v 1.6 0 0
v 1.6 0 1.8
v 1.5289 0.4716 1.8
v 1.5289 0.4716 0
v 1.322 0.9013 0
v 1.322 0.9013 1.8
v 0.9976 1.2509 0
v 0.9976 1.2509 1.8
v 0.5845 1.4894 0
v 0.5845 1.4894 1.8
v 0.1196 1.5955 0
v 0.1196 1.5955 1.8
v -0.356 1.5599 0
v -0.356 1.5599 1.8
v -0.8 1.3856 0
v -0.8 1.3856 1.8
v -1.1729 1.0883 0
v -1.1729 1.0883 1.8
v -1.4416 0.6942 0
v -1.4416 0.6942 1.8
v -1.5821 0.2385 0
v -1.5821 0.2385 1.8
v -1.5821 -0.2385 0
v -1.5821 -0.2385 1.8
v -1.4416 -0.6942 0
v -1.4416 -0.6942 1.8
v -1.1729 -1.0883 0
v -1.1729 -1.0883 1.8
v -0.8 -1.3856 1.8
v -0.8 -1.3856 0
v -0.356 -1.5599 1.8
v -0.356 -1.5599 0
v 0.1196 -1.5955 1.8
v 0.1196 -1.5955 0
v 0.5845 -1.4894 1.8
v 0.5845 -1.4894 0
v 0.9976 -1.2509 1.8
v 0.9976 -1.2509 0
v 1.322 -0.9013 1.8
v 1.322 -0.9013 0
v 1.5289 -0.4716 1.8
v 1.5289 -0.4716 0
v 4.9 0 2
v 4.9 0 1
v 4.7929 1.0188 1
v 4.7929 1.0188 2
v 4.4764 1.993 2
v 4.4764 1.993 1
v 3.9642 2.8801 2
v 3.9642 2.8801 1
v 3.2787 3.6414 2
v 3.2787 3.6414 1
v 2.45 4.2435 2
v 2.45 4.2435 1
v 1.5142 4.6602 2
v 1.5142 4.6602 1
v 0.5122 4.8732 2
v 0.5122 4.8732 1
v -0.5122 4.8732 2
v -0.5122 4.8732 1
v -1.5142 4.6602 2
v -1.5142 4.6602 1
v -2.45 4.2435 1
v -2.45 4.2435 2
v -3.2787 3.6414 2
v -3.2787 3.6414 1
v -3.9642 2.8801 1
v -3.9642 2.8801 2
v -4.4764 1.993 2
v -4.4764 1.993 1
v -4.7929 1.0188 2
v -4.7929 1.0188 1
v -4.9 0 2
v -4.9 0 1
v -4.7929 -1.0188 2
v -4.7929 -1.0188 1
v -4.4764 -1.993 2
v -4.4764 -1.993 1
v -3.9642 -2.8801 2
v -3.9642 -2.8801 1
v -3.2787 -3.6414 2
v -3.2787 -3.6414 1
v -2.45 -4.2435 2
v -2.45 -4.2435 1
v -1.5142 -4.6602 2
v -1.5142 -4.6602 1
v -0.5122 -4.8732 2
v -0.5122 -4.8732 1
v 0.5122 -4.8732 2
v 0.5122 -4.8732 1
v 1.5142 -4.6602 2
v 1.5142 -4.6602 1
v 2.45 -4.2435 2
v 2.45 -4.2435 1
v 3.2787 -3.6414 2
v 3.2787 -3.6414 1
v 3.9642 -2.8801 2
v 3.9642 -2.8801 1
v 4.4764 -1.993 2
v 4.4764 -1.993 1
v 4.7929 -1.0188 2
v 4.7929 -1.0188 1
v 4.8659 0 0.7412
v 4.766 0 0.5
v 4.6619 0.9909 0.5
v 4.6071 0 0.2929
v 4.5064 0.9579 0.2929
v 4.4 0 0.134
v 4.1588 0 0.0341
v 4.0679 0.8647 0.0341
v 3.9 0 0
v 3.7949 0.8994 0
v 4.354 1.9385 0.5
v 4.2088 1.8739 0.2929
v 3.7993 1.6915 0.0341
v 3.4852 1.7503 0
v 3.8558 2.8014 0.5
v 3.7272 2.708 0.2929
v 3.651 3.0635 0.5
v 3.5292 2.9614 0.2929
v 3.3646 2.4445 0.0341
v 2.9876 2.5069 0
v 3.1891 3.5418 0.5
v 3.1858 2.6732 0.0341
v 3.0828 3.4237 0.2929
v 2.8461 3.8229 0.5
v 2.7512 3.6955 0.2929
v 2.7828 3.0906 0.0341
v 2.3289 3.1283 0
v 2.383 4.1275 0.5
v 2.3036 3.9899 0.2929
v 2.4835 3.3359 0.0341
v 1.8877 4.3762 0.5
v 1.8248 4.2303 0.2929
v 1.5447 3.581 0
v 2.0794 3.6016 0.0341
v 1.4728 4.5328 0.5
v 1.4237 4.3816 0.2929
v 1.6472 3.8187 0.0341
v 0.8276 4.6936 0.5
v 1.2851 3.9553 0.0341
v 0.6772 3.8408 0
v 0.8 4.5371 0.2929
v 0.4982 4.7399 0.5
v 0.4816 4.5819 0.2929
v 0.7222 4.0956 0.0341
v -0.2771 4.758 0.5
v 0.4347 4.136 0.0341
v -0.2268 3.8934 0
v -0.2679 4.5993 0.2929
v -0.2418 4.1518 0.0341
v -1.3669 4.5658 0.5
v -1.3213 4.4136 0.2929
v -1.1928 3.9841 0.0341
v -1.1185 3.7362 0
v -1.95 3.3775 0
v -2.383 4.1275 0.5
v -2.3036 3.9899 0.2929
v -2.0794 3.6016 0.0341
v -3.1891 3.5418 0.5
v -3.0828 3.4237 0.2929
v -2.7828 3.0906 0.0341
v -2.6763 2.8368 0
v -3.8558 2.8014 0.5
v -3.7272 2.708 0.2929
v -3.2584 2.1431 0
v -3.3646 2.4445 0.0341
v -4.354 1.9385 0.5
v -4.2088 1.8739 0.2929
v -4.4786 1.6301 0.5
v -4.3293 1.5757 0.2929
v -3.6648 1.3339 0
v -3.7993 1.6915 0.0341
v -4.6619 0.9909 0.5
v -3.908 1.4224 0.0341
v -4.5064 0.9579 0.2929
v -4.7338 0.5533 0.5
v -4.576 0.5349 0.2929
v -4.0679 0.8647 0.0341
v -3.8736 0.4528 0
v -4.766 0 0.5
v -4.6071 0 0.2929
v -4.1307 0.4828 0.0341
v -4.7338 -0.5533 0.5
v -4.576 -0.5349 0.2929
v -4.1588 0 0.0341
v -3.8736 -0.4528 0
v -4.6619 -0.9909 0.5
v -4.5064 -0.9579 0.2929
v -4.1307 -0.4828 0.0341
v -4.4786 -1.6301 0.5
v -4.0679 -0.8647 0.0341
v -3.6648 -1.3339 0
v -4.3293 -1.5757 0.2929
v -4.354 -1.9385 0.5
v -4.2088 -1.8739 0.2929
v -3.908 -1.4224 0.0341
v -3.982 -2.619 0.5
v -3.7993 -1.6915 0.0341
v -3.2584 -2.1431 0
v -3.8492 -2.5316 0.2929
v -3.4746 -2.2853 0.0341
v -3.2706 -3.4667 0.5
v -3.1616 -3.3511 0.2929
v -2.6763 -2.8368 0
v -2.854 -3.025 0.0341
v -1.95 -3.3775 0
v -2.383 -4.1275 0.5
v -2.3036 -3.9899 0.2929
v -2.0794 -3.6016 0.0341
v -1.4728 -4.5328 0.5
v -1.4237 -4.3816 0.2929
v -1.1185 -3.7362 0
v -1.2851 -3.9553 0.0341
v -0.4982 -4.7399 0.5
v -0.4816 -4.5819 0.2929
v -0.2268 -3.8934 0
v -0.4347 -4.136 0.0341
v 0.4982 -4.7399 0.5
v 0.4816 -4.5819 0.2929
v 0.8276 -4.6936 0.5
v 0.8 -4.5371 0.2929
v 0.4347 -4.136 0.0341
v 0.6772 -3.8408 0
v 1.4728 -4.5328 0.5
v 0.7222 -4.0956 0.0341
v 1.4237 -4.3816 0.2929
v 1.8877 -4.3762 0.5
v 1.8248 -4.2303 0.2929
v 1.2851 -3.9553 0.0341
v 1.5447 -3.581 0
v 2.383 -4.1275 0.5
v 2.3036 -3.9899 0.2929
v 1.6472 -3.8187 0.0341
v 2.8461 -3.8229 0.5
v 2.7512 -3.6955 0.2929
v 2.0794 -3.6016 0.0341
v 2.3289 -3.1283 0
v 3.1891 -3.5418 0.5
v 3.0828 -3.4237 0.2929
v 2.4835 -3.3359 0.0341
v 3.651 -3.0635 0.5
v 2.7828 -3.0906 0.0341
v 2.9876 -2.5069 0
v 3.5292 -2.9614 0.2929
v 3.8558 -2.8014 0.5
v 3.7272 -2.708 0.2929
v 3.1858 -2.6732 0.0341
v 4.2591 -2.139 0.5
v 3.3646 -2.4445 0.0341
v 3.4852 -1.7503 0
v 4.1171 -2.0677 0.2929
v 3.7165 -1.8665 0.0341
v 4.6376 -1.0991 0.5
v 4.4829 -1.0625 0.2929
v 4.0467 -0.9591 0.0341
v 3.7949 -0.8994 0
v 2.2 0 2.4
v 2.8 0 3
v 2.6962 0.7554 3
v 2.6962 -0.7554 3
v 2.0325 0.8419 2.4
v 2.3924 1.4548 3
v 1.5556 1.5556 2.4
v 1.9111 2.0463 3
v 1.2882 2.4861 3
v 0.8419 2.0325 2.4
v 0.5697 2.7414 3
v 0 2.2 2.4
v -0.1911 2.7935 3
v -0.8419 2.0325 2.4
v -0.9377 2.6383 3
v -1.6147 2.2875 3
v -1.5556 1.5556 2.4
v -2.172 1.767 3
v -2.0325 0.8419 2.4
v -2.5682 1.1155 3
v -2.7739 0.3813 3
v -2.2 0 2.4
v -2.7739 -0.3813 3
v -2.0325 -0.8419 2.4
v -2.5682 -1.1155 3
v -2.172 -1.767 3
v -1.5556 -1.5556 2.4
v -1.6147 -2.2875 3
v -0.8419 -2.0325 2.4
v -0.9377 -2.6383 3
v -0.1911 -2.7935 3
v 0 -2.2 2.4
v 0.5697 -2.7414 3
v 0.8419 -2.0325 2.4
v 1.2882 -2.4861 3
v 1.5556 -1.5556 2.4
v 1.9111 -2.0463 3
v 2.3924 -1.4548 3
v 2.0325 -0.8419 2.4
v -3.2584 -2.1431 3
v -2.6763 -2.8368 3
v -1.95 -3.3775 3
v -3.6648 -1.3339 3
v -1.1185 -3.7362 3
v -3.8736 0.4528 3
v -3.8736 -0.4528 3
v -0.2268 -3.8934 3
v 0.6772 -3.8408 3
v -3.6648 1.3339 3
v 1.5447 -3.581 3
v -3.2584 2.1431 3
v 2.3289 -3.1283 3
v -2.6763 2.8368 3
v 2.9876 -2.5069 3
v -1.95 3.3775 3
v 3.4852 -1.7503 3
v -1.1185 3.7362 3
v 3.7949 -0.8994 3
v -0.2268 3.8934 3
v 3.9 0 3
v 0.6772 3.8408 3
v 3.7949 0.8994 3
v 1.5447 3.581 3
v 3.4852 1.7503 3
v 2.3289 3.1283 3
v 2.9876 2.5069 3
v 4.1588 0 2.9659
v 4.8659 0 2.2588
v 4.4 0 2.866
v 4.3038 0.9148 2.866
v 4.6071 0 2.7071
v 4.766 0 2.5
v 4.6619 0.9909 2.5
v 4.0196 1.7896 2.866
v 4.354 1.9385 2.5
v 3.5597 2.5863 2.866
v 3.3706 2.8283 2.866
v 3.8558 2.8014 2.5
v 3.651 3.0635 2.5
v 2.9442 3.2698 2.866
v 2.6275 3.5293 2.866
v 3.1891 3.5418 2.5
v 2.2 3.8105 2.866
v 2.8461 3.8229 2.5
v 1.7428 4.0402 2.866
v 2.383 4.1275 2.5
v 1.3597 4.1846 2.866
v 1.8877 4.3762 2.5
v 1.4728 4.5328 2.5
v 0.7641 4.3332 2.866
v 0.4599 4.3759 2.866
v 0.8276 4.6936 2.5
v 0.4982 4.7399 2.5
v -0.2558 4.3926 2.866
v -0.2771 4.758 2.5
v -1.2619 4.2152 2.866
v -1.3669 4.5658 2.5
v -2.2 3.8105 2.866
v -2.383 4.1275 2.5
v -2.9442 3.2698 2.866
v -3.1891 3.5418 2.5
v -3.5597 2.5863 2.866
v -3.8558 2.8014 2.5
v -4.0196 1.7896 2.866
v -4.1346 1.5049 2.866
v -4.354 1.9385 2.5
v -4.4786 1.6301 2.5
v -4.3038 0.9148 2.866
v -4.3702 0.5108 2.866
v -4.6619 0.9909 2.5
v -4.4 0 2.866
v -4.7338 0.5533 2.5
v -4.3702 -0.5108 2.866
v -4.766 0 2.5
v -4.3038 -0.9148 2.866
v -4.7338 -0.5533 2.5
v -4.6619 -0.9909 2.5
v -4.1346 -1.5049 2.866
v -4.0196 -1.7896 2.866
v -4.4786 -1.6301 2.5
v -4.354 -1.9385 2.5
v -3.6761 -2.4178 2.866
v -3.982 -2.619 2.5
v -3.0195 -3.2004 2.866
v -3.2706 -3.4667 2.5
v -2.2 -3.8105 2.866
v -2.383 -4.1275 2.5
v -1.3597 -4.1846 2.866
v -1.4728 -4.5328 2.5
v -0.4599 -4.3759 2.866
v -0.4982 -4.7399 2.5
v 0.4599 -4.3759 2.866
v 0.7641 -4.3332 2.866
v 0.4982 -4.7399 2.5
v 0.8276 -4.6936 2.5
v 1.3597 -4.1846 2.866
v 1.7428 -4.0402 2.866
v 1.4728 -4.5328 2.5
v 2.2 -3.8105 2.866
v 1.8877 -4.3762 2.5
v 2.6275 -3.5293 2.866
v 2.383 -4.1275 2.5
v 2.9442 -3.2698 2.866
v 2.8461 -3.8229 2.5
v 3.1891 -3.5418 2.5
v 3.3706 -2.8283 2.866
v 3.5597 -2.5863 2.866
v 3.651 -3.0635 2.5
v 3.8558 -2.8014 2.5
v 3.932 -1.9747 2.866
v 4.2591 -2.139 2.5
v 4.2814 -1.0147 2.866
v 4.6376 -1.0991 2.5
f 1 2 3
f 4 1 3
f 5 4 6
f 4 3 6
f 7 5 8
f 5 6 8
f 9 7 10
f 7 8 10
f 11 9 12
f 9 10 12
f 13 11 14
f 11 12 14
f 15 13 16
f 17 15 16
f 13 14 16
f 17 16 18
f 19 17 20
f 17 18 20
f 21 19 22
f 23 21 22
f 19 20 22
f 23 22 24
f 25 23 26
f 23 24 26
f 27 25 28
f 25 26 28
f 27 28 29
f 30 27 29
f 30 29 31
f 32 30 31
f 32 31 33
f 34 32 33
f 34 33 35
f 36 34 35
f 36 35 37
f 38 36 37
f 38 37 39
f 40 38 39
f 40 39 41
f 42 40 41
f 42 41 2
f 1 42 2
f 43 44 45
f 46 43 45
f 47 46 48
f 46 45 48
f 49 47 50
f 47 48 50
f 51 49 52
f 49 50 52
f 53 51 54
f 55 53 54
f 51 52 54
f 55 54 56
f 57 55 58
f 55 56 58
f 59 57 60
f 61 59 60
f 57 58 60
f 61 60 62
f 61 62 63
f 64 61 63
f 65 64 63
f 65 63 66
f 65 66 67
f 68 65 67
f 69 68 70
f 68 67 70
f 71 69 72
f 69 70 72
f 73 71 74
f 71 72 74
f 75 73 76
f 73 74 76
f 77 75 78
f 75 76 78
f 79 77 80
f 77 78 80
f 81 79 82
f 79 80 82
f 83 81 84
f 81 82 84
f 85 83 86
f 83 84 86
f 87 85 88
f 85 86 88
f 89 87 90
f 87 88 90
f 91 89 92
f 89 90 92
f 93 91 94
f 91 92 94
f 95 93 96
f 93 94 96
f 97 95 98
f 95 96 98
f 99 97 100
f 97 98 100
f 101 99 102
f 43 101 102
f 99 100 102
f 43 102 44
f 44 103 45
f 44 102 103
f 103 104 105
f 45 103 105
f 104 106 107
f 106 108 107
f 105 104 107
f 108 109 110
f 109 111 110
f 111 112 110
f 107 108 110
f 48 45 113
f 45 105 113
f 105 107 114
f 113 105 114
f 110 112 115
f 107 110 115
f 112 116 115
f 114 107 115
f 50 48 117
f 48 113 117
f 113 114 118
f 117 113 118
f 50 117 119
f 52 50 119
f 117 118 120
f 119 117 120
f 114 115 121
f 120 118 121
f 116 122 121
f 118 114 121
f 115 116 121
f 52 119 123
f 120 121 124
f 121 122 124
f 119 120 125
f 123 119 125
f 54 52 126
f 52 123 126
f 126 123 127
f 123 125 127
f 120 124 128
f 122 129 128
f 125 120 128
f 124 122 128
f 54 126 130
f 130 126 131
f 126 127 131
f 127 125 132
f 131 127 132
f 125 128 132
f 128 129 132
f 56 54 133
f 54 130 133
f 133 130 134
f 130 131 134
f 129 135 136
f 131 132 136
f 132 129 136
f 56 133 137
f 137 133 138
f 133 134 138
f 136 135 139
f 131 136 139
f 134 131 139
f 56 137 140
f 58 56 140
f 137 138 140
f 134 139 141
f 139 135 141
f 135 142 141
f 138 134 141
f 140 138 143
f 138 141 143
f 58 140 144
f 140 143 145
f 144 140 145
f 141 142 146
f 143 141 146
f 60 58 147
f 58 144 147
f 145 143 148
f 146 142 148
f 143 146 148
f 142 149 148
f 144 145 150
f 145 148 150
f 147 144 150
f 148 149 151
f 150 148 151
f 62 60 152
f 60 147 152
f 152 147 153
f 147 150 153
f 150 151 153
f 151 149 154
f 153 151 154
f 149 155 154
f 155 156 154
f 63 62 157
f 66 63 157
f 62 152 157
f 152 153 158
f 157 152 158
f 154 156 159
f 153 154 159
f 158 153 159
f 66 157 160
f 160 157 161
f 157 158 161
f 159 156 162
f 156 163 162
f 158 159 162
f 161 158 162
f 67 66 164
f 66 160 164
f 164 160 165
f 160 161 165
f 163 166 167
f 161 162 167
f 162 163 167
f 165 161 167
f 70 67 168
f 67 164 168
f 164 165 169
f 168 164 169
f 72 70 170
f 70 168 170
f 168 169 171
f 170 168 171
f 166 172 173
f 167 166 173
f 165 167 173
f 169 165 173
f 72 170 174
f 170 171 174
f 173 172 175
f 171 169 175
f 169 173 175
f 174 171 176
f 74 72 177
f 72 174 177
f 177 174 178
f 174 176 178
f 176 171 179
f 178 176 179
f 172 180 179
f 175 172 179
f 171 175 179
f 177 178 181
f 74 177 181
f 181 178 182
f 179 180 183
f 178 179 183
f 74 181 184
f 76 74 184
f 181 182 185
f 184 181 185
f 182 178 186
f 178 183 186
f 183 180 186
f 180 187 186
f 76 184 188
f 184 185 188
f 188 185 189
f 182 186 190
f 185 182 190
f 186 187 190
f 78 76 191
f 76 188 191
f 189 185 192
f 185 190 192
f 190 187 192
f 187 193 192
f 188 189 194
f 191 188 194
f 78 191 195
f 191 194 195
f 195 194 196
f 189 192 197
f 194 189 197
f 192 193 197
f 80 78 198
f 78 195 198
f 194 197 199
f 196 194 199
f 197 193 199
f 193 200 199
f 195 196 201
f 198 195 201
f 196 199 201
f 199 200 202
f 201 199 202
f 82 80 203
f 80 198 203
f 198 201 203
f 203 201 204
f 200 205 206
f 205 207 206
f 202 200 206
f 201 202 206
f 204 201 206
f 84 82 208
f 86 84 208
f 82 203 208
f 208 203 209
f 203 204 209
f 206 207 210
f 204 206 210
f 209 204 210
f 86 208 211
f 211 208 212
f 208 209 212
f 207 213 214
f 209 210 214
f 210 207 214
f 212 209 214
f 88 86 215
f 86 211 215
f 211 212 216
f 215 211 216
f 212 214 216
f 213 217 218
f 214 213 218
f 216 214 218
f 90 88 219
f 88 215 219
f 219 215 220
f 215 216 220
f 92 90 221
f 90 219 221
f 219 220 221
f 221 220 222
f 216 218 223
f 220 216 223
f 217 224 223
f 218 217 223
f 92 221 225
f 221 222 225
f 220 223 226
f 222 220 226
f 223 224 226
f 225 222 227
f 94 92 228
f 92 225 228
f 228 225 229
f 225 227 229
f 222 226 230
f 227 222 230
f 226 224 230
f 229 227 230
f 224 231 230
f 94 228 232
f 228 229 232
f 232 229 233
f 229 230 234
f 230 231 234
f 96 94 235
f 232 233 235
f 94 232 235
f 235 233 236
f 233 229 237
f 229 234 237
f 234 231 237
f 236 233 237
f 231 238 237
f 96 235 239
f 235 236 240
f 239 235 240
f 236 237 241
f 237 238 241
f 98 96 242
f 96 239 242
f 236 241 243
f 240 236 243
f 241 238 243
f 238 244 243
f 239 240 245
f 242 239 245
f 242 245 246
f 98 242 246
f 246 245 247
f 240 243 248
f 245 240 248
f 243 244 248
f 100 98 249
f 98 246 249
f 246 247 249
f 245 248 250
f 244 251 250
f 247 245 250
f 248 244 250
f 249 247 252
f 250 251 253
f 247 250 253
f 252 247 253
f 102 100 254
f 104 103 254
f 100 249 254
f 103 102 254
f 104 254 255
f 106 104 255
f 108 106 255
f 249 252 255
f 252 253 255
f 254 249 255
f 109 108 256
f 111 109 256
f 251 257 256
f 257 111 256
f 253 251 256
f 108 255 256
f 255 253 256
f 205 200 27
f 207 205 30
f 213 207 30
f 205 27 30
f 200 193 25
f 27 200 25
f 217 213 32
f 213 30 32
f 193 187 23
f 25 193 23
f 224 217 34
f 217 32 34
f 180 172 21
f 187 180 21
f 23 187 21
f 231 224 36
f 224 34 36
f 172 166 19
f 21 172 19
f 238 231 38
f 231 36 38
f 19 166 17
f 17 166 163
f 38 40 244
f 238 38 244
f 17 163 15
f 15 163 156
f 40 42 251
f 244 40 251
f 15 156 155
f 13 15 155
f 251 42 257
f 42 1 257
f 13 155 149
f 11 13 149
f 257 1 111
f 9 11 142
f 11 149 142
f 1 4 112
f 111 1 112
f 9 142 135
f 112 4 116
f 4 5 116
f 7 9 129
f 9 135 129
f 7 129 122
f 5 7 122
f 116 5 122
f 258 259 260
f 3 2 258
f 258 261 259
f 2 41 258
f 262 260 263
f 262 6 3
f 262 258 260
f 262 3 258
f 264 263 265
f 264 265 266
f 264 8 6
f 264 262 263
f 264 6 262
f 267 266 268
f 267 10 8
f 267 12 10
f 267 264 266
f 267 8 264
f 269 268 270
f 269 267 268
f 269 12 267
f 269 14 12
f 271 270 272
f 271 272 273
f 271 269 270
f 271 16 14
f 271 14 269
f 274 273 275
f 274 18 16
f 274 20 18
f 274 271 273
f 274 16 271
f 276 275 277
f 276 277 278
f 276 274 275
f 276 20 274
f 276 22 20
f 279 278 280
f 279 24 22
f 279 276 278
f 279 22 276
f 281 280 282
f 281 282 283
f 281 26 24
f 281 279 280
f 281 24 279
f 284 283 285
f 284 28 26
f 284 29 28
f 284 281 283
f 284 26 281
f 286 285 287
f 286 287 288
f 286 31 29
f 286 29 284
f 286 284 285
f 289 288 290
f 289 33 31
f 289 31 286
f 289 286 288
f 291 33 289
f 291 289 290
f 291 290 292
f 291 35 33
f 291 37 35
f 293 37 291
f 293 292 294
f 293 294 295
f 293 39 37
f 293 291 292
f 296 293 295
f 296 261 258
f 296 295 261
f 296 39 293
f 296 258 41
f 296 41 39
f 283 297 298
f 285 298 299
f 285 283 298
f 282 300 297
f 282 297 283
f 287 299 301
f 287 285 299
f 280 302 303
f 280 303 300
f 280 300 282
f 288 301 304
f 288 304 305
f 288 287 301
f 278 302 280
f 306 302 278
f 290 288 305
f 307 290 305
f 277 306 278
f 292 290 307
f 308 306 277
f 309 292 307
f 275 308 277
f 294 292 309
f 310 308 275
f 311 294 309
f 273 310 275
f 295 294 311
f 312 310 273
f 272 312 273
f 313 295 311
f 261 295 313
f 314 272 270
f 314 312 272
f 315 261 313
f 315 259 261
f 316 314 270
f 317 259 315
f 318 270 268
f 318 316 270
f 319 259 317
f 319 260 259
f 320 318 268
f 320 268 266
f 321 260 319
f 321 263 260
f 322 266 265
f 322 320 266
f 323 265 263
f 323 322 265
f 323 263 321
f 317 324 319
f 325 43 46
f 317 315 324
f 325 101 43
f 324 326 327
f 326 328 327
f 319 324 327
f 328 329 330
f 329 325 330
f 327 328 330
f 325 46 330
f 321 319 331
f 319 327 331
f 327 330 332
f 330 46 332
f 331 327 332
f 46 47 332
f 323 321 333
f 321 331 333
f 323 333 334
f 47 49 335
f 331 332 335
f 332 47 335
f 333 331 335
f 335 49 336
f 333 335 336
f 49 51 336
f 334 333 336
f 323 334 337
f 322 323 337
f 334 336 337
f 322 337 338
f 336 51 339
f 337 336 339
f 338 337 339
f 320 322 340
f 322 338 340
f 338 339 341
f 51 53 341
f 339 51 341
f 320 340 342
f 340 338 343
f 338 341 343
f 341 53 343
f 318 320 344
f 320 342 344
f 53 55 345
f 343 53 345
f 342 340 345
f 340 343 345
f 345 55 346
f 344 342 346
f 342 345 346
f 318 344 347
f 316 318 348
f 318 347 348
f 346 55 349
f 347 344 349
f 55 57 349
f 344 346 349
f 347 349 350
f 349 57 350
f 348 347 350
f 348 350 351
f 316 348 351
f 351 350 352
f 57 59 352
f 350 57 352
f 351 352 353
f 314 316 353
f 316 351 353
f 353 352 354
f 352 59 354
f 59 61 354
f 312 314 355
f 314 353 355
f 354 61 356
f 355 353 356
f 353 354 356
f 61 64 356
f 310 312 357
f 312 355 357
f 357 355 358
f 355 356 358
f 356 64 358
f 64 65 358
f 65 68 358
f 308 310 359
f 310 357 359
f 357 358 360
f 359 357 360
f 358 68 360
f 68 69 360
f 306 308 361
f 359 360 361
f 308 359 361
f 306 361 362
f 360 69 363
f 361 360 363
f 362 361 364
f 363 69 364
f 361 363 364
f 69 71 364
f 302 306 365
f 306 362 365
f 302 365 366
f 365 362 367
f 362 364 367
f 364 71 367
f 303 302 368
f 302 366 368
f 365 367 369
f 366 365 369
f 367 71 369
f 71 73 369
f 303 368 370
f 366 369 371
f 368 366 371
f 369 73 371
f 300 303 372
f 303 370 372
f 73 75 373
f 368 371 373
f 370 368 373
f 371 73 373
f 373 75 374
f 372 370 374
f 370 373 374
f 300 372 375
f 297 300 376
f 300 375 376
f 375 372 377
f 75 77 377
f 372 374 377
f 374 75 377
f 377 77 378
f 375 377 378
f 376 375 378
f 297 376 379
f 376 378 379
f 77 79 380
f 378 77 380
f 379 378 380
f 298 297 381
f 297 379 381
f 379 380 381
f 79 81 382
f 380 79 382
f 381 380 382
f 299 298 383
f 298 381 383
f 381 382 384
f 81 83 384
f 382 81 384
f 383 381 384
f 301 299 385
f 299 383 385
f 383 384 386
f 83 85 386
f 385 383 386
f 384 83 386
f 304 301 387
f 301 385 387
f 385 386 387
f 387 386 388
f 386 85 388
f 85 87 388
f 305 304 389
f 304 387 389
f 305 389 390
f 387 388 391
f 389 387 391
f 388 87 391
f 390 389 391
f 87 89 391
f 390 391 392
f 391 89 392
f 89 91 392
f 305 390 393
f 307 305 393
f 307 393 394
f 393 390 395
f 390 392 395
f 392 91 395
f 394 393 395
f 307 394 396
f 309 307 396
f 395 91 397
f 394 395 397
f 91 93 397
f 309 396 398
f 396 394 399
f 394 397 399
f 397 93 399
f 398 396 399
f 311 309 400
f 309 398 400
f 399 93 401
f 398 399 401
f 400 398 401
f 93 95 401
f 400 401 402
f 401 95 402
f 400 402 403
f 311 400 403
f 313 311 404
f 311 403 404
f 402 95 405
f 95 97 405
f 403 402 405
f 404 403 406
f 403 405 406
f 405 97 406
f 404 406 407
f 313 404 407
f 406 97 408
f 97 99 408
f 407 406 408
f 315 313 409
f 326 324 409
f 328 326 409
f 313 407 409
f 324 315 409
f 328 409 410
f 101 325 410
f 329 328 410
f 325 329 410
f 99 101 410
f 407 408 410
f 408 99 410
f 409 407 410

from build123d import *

# Parameters (mm, degrees)
SKETCH_1_R          = 4.9
EXTRUDE_1_DEPTH     = 3
SKETCH_2_R          = 1.6
CUT_EXTRUDE_1_DEPTH = 8.551158851
CHAMFER_1_SIZE      = 1.2
FILLET_1_R          = 1
FILLET_2_R          = 1


with BuildPart() as part:
    # 草图1 → 凸台-拉伸1 (new body)
    with BuildSketch(Plane.XY):
        Circle(SKETCH_1_R)
    extrude(amount=EXTRUDE_1_DEPTH)

    # 草图2 → 切除-拉伸1 (cut, through all)
    with BuildSketch(Plane.XY.offset(3)):
        Circle(SKETCH_2_R)
    extrude(amount=-CUT_EXTRUDE_1_DEPTH, mode=Mode.SUBTRACT)

    # 倒角1
    chamfer_1_edges = [part.edges().sort_by_distance(p)[0] for p in [
        (-1.6, 0, 3),
    ]]
    chamfer(chamfer_1_edges, length=CHAMFER_1_SIZE)

    # 圆角1
    fillet_1_edges = [part.edges().sort_by_distance(p)[0] for p in [
        (-4.9, 0, 3),
    ]]
    fillet(fillet_1_edges, radius=FILLET_1_R)

    # 圆角2
    fillet_2_edges = [part.edges().sort_by_distance(p)[0] for p in [
        (-4.9, 0, 0),
    ]]
    fillet(fillet_2_edges, radius=FILLET_2_R)


solid = part.part
